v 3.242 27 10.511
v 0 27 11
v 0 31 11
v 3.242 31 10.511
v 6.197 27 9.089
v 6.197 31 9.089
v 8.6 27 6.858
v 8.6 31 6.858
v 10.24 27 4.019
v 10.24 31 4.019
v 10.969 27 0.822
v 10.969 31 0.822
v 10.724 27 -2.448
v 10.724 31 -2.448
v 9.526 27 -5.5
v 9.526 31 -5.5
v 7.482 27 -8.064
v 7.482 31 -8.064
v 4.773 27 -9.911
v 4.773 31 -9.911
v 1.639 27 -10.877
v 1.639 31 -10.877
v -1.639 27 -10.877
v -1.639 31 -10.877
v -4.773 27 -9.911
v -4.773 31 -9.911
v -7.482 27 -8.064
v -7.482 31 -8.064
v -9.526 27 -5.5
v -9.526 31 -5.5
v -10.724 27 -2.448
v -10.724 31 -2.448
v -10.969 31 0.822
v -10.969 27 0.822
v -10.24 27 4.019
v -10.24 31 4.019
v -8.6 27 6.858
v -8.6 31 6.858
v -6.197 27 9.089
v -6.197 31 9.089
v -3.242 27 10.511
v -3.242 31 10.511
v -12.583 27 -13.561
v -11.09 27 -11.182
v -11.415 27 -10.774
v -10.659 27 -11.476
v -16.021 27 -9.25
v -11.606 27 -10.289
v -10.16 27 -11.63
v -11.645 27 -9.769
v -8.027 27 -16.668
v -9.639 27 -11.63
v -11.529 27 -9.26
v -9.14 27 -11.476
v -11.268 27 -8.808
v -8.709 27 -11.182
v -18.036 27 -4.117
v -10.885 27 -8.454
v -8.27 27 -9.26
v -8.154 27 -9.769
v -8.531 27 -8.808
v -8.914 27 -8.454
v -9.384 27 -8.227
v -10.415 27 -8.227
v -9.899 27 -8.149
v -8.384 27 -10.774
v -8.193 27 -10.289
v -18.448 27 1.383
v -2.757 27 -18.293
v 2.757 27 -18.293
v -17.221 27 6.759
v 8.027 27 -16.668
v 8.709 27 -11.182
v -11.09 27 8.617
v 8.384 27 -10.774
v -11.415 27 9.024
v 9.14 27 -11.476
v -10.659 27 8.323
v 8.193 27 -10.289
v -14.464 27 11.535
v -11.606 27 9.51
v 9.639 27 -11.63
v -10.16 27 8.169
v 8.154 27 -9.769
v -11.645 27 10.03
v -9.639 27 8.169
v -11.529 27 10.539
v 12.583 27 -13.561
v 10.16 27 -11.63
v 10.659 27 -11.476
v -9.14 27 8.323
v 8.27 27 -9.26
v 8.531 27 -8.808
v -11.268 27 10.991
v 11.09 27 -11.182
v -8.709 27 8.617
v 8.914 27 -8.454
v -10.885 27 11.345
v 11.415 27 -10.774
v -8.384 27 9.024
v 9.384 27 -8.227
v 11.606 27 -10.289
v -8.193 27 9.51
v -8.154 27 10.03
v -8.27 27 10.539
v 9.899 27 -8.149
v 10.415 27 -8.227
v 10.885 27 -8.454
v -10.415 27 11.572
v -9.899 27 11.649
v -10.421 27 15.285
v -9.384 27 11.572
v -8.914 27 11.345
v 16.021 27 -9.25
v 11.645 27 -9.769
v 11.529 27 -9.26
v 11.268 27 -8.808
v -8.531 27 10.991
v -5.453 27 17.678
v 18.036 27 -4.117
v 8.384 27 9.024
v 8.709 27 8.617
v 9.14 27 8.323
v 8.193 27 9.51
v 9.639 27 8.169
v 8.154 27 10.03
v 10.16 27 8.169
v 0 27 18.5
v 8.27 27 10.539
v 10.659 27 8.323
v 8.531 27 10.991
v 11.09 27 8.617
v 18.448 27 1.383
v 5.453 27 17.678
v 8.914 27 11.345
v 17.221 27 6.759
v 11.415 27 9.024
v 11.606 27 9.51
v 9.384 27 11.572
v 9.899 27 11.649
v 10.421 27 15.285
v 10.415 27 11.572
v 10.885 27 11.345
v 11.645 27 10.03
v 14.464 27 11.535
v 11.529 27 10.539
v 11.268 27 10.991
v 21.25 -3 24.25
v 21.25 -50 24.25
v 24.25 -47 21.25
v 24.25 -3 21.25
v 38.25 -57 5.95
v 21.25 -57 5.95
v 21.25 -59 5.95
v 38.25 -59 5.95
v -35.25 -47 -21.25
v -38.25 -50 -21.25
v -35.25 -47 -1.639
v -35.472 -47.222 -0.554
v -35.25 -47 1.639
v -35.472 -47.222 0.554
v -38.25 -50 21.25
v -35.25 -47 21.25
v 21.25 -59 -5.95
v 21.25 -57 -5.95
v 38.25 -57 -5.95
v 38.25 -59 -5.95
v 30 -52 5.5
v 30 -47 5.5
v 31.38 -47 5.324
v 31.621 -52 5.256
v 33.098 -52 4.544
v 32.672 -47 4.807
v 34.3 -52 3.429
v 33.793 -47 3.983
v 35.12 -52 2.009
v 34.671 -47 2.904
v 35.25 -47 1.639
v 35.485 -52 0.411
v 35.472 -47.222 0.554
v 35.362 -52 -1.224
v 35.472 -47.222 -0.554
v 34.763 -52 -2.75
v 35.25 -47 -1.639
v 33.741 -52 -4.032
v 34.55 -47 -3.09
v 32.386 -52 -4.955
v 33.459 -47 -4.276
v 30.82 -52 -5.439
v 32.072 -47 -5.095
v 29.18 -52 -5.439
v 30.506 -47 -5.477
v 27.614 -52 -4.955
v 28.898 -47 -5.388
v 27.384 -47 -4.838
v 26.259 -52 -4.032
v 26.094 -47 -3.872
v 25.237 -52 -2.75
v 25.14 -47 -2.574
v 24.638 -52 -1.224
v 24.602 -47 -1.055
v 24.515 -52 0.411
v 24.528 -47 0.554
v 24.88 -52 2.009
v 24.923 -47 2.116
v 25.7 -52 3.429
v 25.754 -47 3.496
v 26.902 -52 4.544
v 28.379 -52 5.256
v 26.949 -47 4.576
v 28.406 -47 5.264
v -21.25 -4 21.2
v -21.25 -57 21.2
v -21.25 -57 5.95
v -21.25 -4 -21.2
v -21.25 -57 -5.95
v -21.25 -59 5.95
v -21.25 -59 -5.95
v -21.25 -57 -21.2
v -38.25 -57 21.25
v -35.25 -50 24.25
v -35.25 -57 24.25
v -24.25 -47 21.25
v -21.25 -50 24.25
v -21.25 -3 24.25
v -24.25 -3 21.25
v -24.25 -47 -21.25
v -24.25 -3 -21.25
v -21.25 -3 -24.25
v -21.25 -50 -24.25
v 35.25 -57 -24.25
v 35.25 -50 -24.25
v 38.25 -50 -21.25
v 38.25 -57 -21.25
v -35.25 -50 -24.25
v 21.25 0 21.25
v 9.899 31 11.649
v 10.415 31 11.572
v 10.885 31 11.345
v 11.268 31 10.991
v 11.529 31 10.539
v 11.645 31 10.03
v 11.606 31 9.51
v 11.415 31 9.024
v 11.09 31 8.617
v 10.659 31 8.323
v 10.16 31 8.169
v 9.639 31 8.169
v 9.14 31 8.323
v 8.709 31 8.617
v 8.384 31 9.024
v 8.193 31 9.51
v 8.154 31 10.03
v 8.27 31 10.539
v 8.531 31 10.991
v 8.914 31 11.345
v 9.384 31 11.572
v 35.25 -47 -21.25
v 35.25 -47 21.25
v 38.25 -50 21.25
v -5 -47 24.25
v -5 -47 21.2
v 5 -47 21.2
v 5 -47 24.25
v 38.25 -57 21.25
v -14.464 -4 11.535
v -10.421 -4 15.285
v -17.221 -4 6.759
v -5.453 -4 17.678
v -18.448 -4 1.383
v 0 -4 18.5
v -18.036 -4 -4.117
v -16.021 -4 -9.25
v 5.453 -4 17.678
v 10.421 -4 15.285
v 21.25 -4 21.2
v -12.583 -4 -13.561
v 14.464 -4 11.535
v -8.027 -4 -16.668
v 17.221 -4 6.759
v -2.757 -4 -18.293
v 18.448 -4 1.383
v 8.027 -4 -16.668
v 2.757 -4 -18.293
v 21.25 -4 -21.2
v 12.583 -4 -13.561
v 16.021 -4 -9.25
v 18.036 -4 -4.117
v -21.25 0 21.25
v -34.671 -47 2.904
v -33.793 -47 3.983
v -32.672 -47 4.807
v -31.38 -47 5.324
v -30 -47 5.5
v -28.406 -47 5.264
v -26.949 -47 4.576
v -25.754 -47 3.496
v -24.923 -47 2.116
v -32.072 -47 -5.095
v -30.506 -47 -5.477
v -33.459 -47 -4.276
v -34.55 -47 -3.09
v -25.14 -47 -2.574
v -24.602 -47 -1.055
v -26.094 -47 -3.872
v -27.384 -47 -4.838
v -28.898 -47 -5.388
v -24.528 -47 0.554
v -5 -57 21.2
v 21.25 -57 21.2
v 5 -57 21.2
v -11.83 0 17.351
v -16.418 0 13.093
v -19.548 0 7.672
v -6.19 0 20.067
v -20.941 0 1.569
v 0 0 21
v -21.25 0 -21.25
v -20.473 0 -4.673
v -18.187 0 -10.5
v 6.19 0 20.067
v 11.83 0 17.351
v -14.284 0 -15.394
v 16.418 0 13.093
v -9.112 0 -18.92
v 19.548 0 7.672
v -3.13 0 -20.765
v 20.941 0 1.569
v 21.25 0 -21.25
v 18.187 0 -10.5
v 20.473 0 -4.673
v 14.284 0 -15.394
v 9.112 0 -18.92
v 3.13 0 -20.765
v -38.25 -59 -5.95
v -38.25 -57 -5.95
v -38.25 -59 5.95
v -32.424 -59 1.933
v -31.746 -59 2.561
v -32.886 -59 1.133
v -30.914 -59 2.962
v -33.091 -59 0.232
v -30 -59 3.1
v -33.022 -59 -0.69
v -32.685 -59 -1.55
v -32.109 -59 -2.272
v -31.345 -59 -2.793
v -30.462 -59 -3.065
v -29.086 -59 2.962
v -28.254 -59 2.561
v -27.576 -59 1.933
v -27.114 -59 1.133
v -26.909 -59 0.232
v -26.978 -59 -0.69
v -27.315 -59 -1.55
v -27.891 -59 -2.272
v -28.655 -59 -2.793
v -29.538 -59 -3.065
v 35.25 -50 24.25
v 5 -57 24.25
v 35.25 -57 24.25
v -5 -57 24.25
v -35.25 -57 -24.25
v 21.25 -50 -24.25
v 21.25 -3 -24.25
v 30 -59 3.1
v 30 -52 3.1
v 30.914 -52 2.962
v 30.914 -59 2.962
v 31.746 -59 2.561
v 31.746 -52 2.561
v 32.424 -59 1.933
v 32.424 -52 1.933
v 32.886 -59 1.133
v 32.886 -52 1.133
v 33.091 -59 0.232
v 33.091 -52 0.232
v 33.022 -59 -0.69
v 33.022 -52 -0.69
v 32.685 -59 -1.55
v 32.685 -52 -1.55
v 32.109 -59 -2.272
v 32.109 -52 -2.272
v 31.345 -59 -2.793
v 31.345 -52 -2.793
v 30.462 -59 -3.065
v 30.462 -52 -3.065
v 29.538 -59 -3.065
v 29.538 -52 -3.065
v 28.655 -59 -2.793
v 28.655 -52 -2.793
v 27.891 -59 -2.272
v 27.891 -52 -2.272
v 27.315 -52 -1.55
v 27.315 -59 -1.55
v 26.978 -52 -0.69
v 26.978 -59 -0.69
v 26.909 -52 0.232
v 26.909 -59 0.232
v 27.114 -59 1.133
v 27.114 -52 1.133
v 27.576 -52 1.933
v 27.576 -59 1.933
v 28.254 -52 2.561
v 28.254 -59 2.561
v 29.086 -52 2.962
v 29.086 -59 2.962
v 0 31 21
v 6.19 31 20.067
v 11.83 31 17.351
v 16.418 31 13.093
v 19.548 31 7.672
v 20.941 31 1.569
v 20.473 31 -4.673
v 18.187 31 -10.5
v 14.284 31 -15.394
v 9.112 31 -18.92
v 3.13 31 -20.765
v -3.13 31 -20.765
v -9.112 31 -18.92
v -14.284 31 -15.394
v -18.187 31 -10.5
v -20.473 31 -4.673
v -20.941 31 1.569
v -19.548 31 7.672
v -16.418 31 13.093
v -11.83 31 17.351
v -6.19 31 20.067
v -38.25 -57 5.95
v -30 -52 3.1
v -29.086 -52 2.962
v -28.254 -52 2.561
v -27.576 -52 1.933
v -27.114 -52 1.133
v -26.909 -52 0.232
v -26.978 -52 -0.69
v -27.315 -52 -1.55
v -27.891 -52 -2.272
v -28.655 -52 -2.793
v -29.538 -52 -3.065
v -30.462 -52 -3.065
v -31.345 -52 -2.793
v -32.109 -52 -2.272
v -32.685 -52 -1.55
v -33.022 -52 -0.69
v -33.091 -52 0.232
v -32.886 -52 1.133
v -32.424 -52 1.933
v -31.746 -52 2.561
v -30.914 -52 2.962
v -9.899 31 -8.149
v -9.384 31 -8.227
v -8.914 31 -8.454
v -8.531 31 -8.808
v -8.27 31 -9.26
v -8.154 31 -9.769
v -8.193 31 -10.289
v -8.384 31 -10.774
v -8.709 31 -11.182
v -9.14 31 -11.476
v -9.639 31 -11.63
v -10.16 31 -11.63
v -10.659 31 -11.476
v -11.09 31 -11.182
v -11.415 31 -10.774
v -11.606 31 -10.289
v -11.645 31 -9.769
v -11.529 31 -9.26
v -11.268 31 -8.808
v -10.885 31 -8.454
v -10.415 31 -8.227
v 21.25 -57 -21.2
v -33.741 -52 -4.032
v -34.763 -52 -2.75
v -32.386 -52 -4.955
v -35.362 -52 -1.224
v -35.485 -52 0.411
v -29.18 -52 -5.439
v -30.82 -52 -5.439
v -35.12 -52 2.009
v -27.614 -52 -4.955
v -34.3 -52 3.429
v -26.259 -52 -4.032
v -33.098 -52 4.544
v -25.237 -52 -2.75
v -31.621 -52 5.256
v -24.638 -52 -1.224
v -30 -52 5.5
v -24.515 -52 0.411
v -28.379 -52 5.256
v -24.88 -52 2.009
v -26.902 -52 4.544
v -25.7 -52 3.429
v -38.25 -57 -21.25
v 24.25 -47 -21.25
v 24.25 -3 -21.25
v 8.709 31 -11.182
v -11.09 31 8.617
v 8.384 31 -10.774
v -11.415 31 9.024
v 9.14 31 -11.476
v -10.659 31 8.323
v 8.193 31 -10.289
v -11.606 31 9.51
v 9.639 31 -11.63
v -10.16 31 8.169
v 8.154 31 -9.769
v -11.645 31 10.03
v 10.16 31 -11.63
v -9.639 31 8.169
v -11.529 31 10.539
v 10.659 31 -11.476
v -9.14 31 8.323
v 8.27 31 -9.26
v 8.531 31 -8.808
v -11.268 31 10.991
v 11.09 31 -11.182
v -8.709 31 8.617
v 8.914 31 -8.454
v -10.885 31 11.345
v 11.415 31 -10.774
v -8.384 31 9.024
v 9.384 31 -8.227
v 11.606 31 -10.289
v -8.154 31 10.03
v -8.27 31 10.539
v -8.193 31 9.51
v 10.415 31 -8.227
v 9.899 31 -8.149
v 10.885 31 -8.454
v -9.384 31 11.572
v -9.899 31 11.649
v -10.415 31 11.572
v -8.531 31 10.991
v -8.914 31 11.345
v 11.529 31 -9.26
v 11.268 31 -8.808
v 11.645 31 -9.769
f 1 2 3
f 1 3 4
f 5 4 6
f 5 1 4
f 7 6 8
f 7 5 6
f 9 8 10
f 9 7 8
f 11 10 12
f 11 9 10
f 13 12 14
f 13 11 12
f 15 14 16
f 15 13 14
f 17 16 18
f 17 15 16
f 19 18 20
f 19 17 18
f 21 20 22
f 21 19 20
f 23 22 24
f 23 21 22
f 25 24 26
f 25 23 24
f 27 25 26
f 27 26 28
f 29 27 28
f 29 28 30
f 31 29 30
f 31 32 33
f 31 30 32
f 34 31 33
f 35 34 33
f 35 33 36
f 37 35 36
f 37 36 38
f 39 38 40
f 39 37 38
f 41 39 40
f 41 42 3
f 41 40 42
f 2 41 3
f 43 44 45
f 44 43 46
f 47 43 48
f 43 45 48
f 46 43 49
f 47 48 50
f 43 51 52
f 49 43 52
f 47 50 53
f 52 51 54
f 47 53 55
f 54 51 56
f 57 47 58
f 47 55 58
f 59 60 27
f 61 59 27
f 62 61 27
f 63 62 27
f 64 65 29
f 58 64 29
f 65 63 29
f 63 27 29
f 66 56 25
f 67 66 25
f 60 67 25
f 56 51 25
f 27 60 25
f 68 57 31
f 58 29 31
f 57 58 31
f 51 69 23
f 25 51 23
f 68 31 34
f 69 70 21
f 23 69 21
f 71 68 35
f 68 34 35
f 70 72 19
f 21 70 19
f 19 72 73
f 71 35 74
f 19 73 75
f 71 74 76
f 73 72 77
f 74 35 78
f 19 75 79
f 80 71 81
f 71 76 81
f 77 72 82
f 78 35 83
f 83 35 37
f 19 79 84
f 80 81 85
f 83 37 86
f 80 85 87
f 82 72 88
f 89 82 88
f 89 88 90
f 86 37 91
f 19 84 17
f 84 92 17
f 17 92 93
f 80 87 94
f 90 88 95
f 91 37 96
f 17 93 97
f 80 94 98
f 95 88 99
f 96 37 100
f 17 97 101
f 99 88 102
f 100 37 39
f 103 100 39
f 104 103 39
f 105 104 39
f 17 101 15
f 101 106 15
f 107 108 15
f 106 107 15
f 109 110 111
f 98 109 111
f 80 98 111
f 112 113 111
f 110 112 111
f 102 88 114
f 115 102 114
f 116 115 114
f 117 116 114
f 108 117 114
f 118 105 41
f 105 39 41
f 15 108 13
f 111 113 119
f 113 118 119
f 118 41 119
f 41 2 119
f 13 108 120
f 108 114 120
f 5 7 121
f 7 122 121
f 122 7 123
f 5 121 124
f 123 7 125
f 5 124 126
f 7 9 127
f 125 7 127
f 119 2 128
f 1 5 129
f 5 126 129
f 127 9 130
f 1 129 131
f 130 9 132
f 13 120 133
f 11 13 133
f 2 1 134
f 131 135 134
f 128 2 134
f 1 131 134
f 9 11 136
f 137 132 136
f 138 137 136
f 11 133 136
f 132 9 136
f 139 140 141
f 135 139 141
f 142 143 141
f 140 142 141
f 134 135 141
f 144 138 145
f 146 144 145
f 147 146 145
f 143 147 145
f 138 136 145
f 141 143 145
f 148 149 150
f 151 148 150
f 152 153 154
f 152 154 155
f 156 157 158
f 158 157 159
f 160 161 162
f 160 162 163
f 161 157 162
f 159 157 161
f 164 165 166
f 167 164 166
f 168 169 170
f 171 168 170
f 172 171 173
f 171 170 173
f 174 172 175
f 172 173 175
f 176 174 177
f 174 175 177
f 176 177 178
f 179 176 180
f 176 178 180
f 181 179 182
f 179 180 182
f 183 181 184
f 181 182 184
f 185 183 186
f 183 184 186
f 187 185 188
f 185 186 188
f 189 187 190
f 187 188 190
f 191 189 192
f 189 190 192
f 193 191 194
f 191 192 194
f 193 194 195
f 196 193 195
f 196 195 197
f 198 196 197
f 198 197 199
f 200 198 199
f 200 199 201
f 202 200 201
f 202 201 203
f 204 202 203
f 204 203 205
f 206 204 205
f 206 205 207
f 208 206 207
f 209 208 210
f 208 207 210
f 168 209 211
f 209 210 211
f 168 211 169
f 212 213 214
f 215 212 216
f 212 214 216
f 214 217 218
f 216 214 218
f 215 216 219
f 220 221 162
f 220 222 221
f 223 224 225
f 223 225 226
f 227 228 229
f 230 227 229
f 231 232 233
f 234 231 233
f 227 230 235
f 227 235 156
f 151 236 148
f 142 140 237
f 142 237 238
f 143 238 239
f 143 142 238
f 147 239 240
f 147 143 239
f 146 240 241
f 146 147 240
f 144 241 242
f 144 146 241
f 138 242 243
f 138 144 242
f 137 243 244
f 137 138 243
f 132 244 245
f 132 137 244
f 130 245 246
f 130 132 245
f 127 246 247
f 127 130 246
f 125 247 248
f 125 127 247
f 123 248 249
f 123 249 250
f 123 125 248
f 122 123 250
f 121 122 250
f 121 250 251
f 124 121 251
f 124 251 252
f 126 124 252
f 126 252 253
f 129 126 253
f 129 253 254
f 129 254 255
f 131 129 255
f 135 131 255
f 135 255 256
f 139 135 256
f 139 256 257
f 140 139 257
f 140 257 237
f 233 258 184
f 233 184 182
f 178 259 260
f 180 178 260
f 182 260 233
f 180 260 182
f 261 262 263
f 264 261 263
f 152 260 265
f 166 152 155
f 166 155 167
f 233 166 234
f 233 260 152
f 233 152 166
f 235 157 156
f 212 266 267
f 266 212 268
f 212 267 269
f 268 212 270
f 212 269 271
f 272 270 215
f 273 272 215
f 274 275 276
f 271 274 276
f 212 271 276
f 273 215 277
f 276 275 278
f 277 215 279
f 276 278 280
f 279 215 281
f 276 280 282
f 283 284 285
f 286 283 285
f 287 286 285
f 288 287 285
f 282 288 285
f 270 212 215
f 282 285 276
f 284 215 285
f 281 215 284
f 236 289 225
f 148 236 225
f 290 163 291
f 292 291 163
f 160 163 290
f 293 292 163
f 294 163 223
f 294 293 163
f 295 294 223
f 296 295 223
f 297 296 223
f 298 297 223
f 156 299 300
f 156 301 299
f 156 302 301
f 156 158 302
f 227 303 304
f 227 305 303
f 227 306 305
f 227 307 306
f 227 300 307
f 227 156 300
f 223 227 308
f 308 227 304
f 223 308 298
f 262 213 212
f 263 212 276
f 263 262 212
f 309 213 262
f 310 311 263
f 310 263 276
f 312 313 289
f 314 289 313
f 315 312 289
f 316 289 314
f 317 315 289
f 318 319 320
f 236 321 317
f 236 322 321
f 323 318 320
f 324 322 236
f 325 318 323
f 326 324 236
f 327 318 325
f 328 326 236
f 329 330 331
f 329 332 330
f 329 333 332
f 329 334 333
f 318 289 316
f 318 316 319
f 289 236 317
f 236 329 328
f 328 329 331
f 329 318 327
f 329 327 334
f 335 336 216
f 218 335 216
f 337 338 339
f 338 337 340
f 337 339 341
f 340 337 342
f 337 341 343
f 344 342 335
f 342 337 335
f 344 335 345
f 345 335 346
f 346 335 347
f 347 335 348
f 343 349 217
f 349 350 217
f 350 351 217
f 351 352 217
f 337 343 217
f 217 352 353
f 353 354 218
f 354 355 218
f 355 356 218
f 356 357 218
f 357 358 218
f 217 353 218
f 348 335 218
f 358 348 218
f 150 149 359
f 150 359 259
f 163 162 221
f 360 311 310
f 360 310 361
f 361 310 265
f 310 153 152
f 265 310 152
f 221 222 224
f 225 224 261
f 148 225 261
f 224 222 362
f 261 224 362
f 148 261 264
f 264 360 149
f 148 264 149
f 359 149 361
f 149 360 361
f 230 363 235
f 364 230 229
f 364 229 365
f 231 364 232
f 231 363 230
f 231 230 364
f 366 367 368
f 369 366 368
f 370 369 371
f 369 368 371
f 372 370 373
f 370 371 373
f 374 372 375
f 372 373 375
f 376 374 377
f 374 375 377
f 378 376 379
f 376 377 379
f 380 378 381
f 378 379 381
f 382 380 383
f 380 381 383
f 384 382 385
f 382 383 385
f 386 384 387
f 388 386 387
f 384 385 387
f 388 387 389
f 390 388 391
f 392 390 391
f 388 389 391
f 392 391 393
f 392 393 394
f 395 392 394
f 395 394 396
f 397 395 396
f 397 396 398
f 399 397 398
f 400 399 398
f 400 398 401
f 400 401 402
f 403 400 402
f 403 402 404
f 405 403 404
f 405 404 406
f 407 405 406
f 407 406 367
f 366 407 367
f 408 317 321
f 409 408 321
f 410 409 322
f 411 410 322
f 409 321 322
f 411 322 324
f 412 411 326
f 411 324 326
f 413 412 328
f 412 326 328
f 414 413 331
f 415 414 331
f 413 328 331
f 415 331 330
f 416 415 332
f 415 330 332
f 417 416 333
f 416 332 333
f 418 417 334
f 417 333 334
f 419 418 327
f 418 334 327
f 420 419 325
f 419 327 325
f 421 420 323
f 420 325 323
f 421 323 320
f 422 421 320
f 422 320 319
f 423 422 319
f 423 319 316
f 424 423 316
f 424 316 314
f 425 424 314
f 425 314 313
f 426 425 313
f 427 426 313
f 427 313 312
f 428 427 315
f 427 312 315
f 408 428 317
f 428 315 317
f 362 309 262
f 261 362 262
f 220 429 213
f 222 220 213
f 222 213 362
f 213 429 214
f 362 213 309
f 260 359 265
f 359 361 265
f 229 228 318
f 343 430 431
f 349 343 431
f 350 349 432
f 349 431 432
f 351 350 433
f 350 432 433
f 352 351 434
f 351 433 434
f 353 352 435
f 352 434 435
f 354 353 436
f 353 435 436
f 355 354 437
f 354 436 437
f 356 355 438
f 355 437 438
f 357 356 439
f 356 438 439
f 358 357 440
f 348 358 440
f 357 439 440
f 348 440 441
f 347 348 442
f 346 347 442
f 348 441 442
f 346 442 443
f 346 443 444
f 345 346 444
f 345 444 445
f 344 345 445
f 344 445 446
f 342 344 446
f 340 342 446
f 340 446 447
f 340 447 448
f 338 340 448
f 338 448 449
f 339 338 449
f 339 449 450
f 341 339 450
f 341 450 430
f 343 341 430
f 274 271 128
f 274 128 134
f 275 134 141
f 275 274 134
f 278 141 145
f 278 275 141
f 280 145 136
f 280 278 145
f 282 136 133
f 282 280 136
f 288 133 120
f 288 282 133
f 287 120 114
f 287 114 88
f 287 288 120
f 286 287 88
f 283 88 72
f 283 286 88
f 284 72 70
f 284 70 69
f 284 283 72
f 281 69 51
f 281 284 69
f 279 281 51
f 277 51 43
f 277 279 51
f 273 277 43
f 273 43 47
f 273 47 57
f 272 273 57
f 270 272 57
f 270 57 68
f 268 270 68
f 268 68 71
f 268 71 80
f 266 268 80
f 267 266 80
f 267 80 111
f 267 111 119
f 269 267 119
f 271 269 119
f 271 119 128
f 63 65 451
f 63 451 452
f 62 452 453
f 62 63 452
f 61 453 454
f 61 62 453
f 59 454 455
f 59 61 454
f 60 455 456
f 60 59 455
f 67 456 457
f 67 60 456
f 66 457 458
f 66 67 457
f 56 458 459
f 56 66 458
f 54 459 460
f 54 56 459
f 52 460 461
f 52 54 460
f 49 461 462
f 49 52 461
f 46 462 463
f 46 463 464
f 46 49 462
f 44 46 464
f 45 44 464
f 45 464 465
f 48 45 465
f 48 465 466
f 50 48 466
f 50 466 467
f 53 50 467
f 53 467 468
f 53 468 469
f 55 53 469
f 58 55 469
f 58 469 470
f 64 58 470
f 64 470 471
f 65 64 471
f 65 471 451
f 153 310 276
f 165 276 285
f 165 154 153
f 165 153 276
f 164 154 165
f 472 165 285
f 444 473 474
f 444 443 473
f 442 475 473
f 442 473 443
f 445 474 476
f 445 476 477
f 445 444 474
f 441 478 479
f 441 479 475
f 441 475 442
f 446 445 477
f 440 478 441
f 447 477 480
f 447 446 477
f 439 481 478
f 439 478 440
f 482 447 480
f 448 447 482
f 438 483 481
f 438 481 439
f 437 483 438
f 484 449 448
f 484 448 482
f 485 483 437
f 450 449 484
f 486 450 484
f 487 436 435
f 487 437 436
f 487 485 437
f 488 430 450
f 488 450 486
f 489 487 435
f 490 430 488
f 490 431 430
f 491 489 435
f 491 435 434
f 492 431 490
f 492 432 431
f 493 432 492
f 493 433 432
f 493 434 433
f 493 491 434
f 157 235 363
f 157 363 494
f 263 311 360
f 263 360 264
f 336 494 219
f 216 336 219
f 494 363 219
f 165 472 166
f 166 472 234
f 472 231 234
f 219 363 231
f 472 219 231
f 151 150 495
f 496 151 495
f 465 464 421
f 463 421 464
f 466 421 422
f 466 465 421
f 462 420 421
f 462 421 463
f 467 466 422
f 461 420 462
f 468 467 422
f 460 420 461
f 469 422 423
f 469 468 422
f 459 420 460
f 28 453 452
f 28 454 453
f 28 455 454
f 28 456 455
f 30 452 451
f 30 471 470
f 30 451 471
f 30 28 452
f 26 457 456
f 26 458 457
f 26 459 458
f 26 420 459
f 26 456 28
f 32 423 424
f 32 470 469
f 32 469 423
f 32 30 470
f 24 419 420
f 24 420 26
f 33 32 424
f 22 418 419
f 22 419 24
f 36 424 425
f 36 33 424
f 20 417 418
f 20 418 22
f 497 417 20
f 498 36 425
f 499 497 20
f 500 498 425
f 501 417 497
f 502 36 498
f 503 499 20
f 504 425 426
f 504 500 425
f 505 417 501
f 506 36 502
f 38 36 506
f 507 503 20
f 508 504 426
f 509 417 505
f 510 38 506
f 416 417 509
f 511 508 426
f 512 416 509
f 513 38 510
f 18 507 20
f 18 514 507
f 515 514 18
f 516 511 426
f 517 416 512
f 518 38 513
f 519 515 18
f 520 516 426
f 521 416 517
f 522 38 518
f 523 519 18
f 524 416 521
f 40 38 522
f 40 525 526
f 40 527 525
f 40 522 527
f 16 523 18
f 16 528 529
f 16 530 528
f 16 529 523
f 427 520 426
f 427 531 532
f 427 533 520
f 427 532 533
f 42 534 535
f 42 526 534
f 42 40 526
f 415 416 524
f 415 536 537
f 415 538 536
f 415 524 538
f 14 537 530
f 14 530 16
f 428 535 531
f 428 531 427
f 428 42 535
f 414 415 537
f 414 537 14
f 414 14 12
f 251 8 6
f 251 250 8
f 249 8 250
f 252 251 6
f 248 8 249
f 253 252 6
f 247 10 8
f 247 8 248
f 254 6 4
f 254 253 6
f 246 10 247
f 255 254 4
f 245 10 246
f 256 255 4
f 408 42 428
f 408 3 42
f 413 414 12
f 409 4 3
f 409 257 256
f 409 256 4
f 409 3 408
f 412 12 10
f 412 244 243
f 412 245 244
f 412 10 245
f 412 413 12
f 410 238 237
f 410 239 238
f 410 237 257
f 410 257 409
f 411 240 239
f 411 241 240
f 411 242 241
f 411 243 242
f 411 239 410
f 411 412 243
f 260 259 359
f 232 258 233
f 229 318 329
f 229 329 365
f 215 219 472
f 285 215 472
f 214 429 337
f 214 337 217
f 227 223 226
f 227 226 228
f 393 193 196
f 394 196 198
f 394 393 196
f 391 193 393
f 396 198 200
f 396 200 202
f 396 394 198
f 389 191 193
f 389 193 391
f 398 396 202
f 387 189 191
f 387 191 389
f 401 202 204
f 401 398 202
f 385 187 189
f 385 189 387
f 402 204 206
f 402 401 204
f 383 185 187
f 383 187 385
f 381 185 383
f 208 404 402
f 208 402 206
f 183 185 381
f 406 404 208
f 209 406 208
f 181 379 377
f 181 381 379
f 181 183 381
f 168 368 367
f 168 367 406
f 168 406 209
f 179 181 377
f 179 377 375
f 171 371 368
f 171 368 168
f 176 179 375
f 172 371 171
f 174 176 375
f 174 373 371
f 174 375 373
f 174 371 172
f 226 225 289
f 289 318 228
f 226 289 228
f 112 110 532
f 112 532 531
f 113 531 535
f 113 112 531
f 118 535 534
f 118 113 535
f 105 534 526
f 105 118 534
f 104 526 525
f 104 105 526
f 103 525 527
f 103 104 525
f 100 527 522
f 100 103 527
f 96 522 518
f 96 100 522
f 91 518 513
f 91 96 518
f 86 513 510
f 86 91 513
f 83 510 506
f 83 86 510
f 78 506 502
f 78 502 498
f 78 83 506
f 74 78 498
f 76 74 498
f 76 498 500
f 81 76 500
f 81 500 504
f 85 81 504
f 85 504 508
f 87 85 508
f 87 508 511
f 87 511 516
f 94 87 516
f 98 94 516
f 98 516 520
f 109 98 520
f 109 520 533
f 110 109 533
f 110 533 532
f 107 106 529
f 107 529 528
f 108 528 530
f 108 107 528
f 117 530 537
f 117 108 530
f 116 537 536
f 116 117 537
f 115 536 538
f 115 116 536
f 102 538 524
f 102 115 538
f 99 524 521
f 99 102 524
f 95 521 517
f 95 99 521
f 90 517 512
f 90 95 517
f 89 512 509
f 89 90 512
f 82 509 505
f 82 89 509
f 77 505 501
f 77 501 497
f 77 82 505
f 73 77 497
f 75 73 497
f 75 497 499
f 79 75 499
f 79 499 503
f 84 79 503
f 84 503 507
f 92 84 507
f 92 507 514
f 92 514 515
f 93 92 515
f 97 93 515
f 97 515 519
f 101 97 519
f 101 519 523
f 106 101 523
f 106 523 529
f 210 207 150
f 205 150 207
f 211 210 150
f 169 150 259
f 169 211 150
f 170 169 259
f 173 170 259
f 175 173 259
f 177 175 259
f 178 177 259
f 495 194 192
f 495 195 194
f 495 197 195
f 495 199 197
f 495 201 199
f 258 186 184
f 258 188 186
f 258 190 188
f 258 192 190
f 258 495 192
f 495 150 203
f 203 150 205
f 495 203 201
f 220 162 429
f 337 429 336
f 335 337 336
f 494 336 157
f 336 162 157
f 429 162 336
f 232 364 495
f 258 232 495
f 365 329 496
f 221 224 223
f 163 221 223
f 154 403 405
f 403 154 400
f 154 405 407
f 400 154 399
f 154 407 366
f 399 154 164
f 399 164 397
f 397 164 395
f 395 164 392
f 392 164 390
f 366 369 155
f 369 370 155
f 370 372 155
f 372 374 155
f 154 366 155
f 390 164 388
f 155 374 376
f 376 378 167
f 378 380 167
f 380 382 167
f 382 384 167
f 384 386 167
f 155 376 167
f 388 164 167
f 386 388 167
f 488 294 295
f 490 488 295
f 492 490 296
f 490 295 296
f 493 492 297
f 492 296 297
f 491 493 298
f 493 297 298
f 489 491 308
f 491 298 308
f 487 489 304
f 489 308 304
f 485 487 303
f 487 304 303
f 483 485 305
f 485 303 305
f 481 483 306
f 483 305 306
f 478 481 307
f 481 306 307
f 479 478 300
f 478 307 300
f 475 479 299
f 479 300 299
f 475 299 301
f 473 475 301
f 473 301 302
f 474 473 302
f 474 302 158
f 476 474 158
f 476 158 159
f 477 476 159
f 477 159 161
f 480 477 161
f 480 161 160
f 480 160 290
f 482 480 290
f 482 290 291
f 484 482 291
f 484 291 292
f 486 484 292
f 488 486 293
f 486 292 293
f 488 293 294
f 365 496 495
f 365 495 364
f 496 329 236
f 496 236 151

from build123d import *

# Parameters (mm, degrees)
SKETCH1_R               = 21
SKETCH1_R_2             = 1.75
BOSS_EXTRUDE1_DEPTH     = 31
SKETCH3_W               = 48.5
SKETCH3_H               = 48.5
SKETCH3_R               = 18.5
BOSS_EXTRUDE2_DEPTH     = 57
CUT_EXTRUDE2_DEPTH      = 67.521613029
CUT_EXTRUDE2_DEPTH_BACK = 67.521613029
SKETCH4_R               = 11
SKETCH5_W               = 10
SKETCH5_H               = 20
CUT_EXTRUDE3_DEPTH      = 67.521613029
BOSS_EXTRUDE3_START     = -57
SKETCH6_W               = 14
SKETCH6_H               = 48.5
BOSS_EXTRUDE3_DEPTH     = 10
BOSS_EXTRUDE4_START     = -57
SKETCH7_W               = 76.5
SKETCH7_H               = 11.9
BOSS_EXTRUDE4_DEPTH     = 2
CUT_EXTRUDE1_DEPTH      = 27
CUT_EXTRUDE1_DEPTH_BACK = 75.378256231
SKETCH2_R               = 18.5
SKETCH8_R               = 3.1
CUT_EXTRUDE4_DEPTH      = 75.378256231
CUT_EXTRUDE5_START      = -47
SKETCH9_R               = 5.5
CUT_EXTRUDE5_DEPTH      = 5
CUT_EXTRUDE6_DEPTH      = 53
CUT_EXTRUDE6_DEPTH_BACK = 75.378256231
CUT_EXTRUDE6_START      = -57
SKETCH11_W              = 42.5
SKETCH11_H              = 42.4


with BuildPart() as part:
    # Sketch1 → Boss-Extrude1 (new body)
    with BuildSketch(Plane(origin=(0, 0, 0), x_dir=(1, 0, 0), z_dir=(0, 1, 0))):
        with Locations(Location((0, 0, 0), (0, 0, 270))):
            Circle(SKETCH1_R)
        with Locations(Location((-9.899494937, -9.899494937, 0), (0, 0, 270))):
            Circle(SKETCH1_R_2, mode=Mode.SUBTRACT)
        with Locations(Location((-9.899494937, 9.899494937, 0), (0, 0, 270))):
            Circle(SKETCH1_R_2, mode=Mode.SUBTRACT)
        with Locations(Location((9.899494937, 9.899494937, 0), (0, 0, 270))):
            Circle(SKETCH1_R_2, mode=Mode.SUBTRACT)
        with Locations(Location((9.899494937, -9.899494937, 0), (0, 0, 270))):
            Circle(SKETCH1_R_2, mode=Mode.SUBTRACT)
    extrude(amount=BOSS_EXTRUDE1_DEPTH)

    # Sketch3 → Boss-Extrude2 (add)
    with BuildSketch(Plane(origin=(0, 0, 0), x_dir=(1, 0, 0), z_dir=(0, 1, 0))):
        Rectangle(SKETCH3_W, SKETCH3_H)
        with Locations(Location((0, 0, 0), (0, 0, 270))):
            Circle(SKETCH3_R, mode=Mode.SUBTRACT)
    extrude(amount=-BOSS_EXTRUDE2_DEPTH)

    # Sketch4 → Cut-Extrude2 (cut, two sides: drawn at the far end of the back side and taken through both)
    with BuildSketch(Plane(origin=(0, 0, 0), x_dir=(1, 0, 0), z_dir=(0, 1, 0)).offset(-CUT_EXTRUDE2_DEPTH_BACK)):
        with Locations(Location((0, 0, 0), (0, 0, 270))):
            Circle(SKETCH4_R)
    extrude(amount=CUT_EXTRUDE2_DEPTH + CUT_EXTRUDE2_DEPTH_BACK, mode=Mode.SUBTRACT)

    # Sketch5 → Cut-Extrude3 (cut, through all)
    with BuildSketch(Plane.XY):
        with Locations((0, -57)):
            Rectangle(SKETCH5_W, SKETCH5_H)
    extrude(amount=CUT_EXTRUDE3_DEPTH, mode=Mode.SUBTRACT)

    # Sketch6 → Boss-Extrude3 (add)
    with BuildSketch(Plane(origin=(0, 0, 0), x_dir=(1, 0, 0), z_dir=(0, 1, 0)).offset(BOSS_EXTRUDE3_START)):
        with Locations((-31.25, 0)):
            Rectangle(SKETCH6_W, SKETCH6_H)
        with Locations((31.25, 0)):
            Rectangle(SKETCH6_W, SKETCH6_H)
    extrude(amount=BOSS_EXTRUDE3_DEPTH)

    # Sketch7 → Boss-Extrude4 (add)
    with BuildSketch(Plane(origin=(0, 0, 0), x_dir=(1, 0, 0), z_dir=(0, 1, 0)).offset(BOSS_EXTRUDE4_START)):
        Rectangle(SKETCH7_W, SKETCH7_H)
    extrude(amount=-BOSS_EXTRUDE4_DEPTH)

    # Sketch2 → Cut-Extrude1 (cut, two sides: drawn at the far end of the back side and taken through both)
    with BuildSketch(Plane(origin=(0, 0, 0), x_dir=(1, 0, 0), z_dir=(0, 1, 0)).offset(-CUT_EXTRUDE1_DEPTH_BACK)):
        with Locations(Location((0, 0, 0), (0, 0, 270))):
            Circle(SKETCH2_R)
    extrude(amount=CUT_EXTRUDE1_DEPTH + CUT_EXTRUDE1_DEPTH_BACK, mode=Mode.SUBTRACT)

    # Sketch8 → Cut-Extrude4 (cut, through all)
    with BuildSketch(Plane(origin=(0, 0, 0), x_dir=(1, 0, 0), z_dir=(0, 1, 0))):
        with Locations(Location((-30, 0, 0), (0, 0, 270))):
            Circle(SKETCH8_R)
        with Locations(Location((30, 0, 0), (0, 0, 270))):
            Circle(SKETCH8_R)
    extrude(amount=-CUT_EXTRUDE4_DEPTH, mode=Mode.SUBTRACT)

    # Sketch9 → Cut-Extrude5 (cut)
    with BuildSketch(Plane(origin=(0, 0, 0), x_dir=(1, 0, 0), z_dir=(0, 1, 0)).offset(CUT_EXTRUDE5_START)):
        with Locations(Location((-30, 0, 0), (0, 0, 270))):
            Circle(SKETCH9_R)
        with Locations(Location((30, 0, 0), (0, 0, 270))):
            Circle(SKETCH9_R)
    extrude(amount=-CUT_EXTRUDE5_DEPTH, mode=Mode.SUBTRACT)

    # Chamfer1
    # the kernel refuses this chamfer: 3 mm, written as the material it takes off along each edge
    with BuildSketch(Plane(origin=(-22.25, -2, 22.25), x_dir=(0, -0.7071067811865476, 0.7071067811865476), z_dir=(-0.5773502691896257, 0.5773502691896257, 0.5773502691896257)), Plane(origin=(-22.25, -2, -22.25), x_dir=(-0.7071067811865476, -0.7071067811865476, 0), z_dir=(-0.5773502691896257, 0.5773502691896257, -0.5773502691896257)), Plane(origin=(36.25, -49, 22.25), x_dir=(-1.6747652892626914e-15, 0.7071067811865467, -0.7071067811865483), z_dir=(0.5773502691896266, 0.5773502691896266, 0.577350269189624))) as chamfer1_piece_1:
        Polygon((-2.121320344, 1.224744871), (2.121320344, 1.224744871), (0, -2.449489743), align=None)
    extrude(amount=3.810511777, mode=Mode.SUBTRACT)
    with BuildSketch(Plane(origin=(22.25, -2, 22.25), x_dir=(0, -0.7071067811865476, 0.7071067811865476), z_dir=(0.5773502691896257, 0.5773502691896257, 0.5773502691896257)), Plane(origin=(22.25, -2, -22.25), x_dir=(0.7071067811865476, -0.7071067811865476, 0), z_dir=(0.5773502691896257, 0.5773502691896257, -0.5773502691896257)), Plane(origin=(-36.25, -49, -22.25), x_dir=(0.7071067811865476, 0.7071067811865476, 0), z_dir=(-0.5773502691896264, 0.5773502691896264, -0.5773502691896244)), Plane(origin=(-36.25, -49, 22.25), x_dir=(0.7071067811865479, 0, 0.707106781186547), z_dir=(-0.5773502691896255, 0.5773502691896255, 0.5773502691896262)), Plane(origin=(36.25, -49, -22.25), x_dir=(0.7071067811865476, -0.7071067811865476, 0), z_dir=(0.5773502691896251, 0.5773502691896258, -0.5773502691896265))) as chamfer1_piece_2:
        Polygon((-2.121320344, -1.224744871), (2.121320344, -1.224744871), (0, 2.449489743), align=None)
    extrude(amount=3.810511777, mode=Mode.SUBTRACT)
    with BuildSketch(Plane(origin=(-24.25, 0, 31.965048964), x_dir=(0.9996219169112968, 0.02749587661058636, 0), z_dir=(0, 0, -1)), Plane(origin=(31.965048964, 0, 24.25), x_dir=(0, 0.02749587661058636, -0.9996219169112968), z_dir=(-1, 0, 0)), Plane(origin=(24.25, 0, -31.965048964), x_dir=(-0.9996219169112968, 0.02749587661058636, 0), z_dir=(0, 0, 1)), Plane(origin=(-31.965048964, 0, -24.25), x_dir=(0, 0.02749587661058636, 0.9996219169112968), z_dir=(1, 0, 0))) as chamfer1_piece_3:
        with BuildLine():
            Line((3.086019586, 0), (-0.169641465, 3.081353381))
            Line((-0.169641465, 3.081353381), (-0.22961878, 3.079703628))
            ThreePointArc((-0.22961878, 3.079703628), (-0.102387681, 1.540193489), (-0.059977315, -0.001649753))
            Line((-0.059977315, -0.001649753), (0.001649753, -0.059977315))
            ThreePointArc((0.001649753, -0.059977315), (1.543492994, -0.017566949), (3.087669338, -0.059977315))
            Line((3.087669338, -0.059977315), (3.086019586, 0))
        make_face()
    extrude(amount=63.930097928, mode=Mode.SUBTRACT)
    with BuildSketch(Plane(origin=(-24.25, 7.715048964, -24.25), x_dir=(-0.027495876610586768, 0, 0.9996219169112968), z_dir=(0, -1, 0)), Plane(origin=(-24.25, 7.715048964, 24.25), x_dir=(0.9996219169112965, 0, 0.02749587661058676), z_dir=(0, -1, 0))) as chamfer1_piece_4:
        with BuildLine():
            Line((3.086019586, 0), (-0.169641465, -3.081353381))
            Line((-0.169641465, -3.081353381), (-0.22961878, -3.079703628))
            ThreePointArc((-0.22961878, -3.079703628), (-0.102387681, -1.540193489), (-0.059977315, 0.001649753))
            Line((-0.059977315, 0.001649753), (0.001649753, 0.059977315))
            ThreePointArc((0.001649753, 0.059977315), (1.543492994, 0.017566949), (3.087669338, 0.059977315))
            Line((3.087669338, 0.059977315), (3.086019586, 0))
        make_face()
    extrude(amount=54.715048964, mode=Mode.SUBTRACT)
    with BuildSketch(Plane(origin=(-38.25, -64.715048964, -24.25), x_dir=(0.9996219169112965, 0, -0.027495876610587913), z_dir=(0, 1, 0)), Plane(origin=(38.25, -64.715048964, 24.25), x_dir=(-0.9996219169112965, 0, 0.027495876610587913), z_dir=(0, 1, 0))) as chamfer1_piece_5:
        with BuildLine():
            Line((3.086019586, 0), (-0.169641465, -3.081353381))
            Line((-0.169641465, -3.081353381), (-0.22961878, -3.079703628))
            ThreePointArc((-0.22961878, -3.079703628), (-0.102387681, -1.540193489), (-0.059977315, 0.001649753))
            Line((-0.059977315, 0.001649753), (0.001649753, 0.059977315))
            ThreePointArc((0.001649753, 0.059977315), (1.543492994, 0.017566949), (3.087669338, 0.059977315))
            Line((3.087669338, 0.059977315), (3.086019586, 0))
        make_face()
    extrude(amount=25.430097928, mode=Mode.SUBTRACT)
    with BuildSketch(Plane(origin=(-38.25, -64.715048964, 24.25), x_dir=(0.9996219169112968, 0, 0.027495876610585616), z_dir=(0, 1, 0)), Plane(origin=(38.25, -64.715048964, -24.25), x_dir=(-0.9996219169112968, 0, -0.027495876610585616), z_dir=(0, 1, 0))) as chamfer1_piece_6:
        with BuildLine():
            Line((3.086019586, 0), (-0.169641465, 3.081353381))
            Line((-0.169641465, 3.081353381), (-0.22961878, 3.079703628))
            ThreePointArc((-0.22961878, 3.079703628), (-0.102387681, 1.540193489), (-0.059977315, -0.001649753))
            Line((-0.059977315, -0.001649753), (0.001649753, -0.059977315))
            ThreePointArc((0.001649753, -0.059977315), (1.543492994, -0.017566949), (3.087669338, -0.059977315))
            Line((3.087669338, -0.059977315), (3.086019586, 0))
        make_face()
    extrude(amount=25.430097928, mode=Mode.SUBTRACT)
    with BuildSketch(Plane(origin=(-45.965048964, -47, -24.25), x_dir=(0, -0.9996219169112965, -0.02749587661058676), z_dir=(1, 0, 0)), Plane(origin=(-24.25, -47, 24.25), x_dir=(0, -0.9996219169112965, 0.02749587661058676), z_dir=(-1, 0, 0))) as chamfer1_piece_7:
        with BuildLine():
            Line((3.086019586, 0), (-0.169641465, -3.081353381))
            Line((-0.169641465, -3.081353381), (-0.22961878, -3.079703628))
            ThreePointArc((-0.22961878, -3.079703628), (-0.102387681, -1.540193489), (-0.059977315, 0.001649753))
            Line((-0.059977315, 0.001649753), (0.001649753, 0.059977315))
            ThreePointArc((0.001649753, 0.059977315), (1.543492994, 0.017566949), (3.087669338, 0.059977315))
            Line((3.087669338, 0.059977315), (3.086019586, 0))
        make_face()
    extrude(amount=21.715048964, mode=Mode.SUBTRACT)
    with BuildSketch(Plane(origin=(-38.25, -47, 31.965048964), x_dir=(-0.027495876610586768, -0.9996219169112968, 0), z_dir=(0, 0, -1)), Plane(origin=(38.25, -47, 31.965048964), x_dir=(-0.9996219169112965, 0.02749587661058676, 0), z_dir=(0, 0, -1))) as chamfer1_piece_8:
        with BuildLine():
            Line((3.086019586, 0), (-0.169641465, -3.081353381))
            Line((-0.169641465, -3.081353381), (-0.22961878, -3.079703628))
            ThreePointArc((-0.22961878, -3.079703628), (-0.102387681, -1.540193489), (-0.059977315, 0.001649753))
            Line((-0.059977315, 0.001649753), (0.001649753, 0.059977315))
            ThreePointArc((0.001649753, 0.059977315), (1.543492994, 0.017566949), (3.087669338, 0.059977315))
            Line((3.087669338, 0.059977315), (3.086019586, 0))
        make_face()
    extrude(amount=63.930097928, mode=Mode.SUBTRACT)
    with BuildSketch(Plane(origin=(24.25, 7.715048964, 24.25), x_dir=(-0.9996219169112965, 0, 0.02749587661058676), z_dir=(0, -1, 0)), Plane(origin=(24.25, 7.715048964, -24.25), x_dir=(0.027495876610586768, 0, 0.9996219169112968), z_dir=(0, -1, 0))) as chamfer1_piece_9:
        with BuildLine():
            Line((3.086019586, 0), (-0.169641465, 3.081353381))
            Line((-0.169641465, 3.081353381), (-0.22961878, 3.079703628))
            ThreePointArc((-0.22961878, 3.079703628), (-0.102387681, 1.540193489), (-0.059977315, -0.001649753))
            Line((-0.059977315, -0.001649753), (0.001649753, -0.059977315))
            ThreePointArc((0.001649753, -0.059977315), (1.543492994, -0.017566949), (3.087669338, -0.059977315))
            Line((3.087669338, -0.059977315), (3.086019586, 0))
        make_face()
    extrude(amount=54.715048964, mode=Mode.SUBTRACT)
    with BuildSketch(Plane(origin=(45.965048964, -47, -24.25), x_dir=(0, -0.9996219169112965, -0.02749587661058676), z_dir=(-1, 0, 0)), Plane(origin=(24.25, -47, 24.25), x_dir=(0, -0.9996219169112965, 0.02749587661058676), z_dir=(1, 0, 0))) as chamfer1_piece_10:
        with BuildLine():
            Line((3.086019586, 0), (-0.169641465, 3.081353381))
            Line((-0.169641465, 3.081353381), (-0.22961878, 3.079703628))
            ThreePointArc((-0.22961878, 3.079703628), (-0.102387681, 1.540193489), (-0.059977315, -0.001649753))
            Line((-0.059977315, -0.001649753), (0.001649753, -0.059977315))
            ThreePointArc((0.001649753, -0.059977315), (1.543492994, -0.017566949), (3.087669338, -0.059977315))
            Line((3.087669338, -0.059977315), (3.086019586, 0))
        make_face()
    extrude(amount=21.715048964, mode=Mode.SUBTRACT)
    with BuildSketch(Plane(origin=(-24.25, 7.715048964, -24.25), x_dir=(-0.027495876610586768, 0, 0.9996219169112968), z_dir=(0, -1, 0))) as chamfer1_piece_11a_section:
        with BuildLine():
            Line((3.086019586, 0), (-0.169641465, -3.081353381))
            Line((-0.169641465, -3.081353381), (-0.22961878, -3.079703628))
            ThreePointArc((-0.22961878, -3.079703628), (-0.102387681, -1.540193489), (-0.059977315, 0.001649753))
            Line((-0.059977315, 0.001649753), (0.001649753, 0.059977315))
            ThreePointArc((0.001649753, 0.059977315), (1.543492994, 0.017566949), (3.087669338, 0.059977315))
            Line((3.087669338, 0.059977315), (3.086019586, 0))
        make_face()
    chamfer1_piece_11a = extrude(amount=62.430097928, mode=Mode.PRIVATE)
    chamfer1_piece_11a = split(chamfer1_piece_11a, bisect_by=Plane(origin=(-23.26061912, -47, -23.26061912), z_dir=(0, -1, 0)), keep=Keep.TOP, mode=Mode.PRIVATE)
    with BuildSketch(Plane(origin=(-45.965048964, -47, -24.25), x_dir=(0, -0.9996219169112965, -0.02749587661058676), z_dir=(1, 0, 0))) as chamfer1_piece_11b_section:
        with BuildLine():
            Line((3.086019586, 0), (-0.169641465, -3.081353381))
            Line((-0.169641465, -3.081353381), (-0.22961878, -3.079703628))
            ThreePointArc((-0.22961878, -3.079703628), (-0.102387681, -1.540193489), (-0.059977315, 0.001649753))
            Line((-0.059977315, 0.001649753), (0.001649753, 0.059977315))
            ThreePointArc((0.001649753, 0.059977315), (1.543492994, 0.017566949), (3.087669338, 0.059977315))
            Line((3.087669338, 0.059977315), (3.086019586, 0))
        make_face()
    chamfer1_piece_11b = extrude(amount=29.430097928, mode=Mode.PRIVATE)
    chamfer1_piece_11b = split(chamfer1_piece_11b, bisect_by=Plane(origin=(-24.25, -47.98938088, -23.26061912), z_dir=(1, 0, 0)), keep=Keep.TOP, mode=Mode.PRIVATE)
    chamfer1_piece_11 = chamfer1_piece_11a & chamfer1_piece_11b
    add(chamfer1_piece_11, mode=Mode.SUBTRACT)
    with BuildSketch(Plane(origin=(-16.534951036, -47, 24.25), x_dir=(0, -0.9996219169112965, 0.02749587661058676), z_dir=(-1, 0, 0))) as chamfer1_piece_12a_section:
        with BuildLine():
            Line((3.086019586, 0), (-0.169641465, -3.081353381))
            Line((-0.169641465, -3.081353381), (-0.22961878, -3.079703628))
            ThreePointArc((-0.22961878, -3.079703628), (-0.102387681, -1.540193489), (-0.059977315, 0.001649753))
            Line((-0.059977315, 0.001649753), (0.001649753, 0.059977315))
            ThreePointArc((0.001649753, 0.059977315), (1.543492994, 0.017566949), (3.087669338, 0.059977315))
            Line((3.087669338, 0.059977315), (3.086019586, 0))
        make_face()
    chamfer1_piece_12a = extrude(amount=29.430097928, mode=Mode.PRIVATE)
    chamfer1_piece_12a = split(chamfer1_piece_12a, bisect_by=Plane(origin=(-24.25, -47.98938088, 23.26061912), z_dir=(1, 0, 0)), keep=Keep.TOP, mode=Mode.PRIVATE)
    with BuildSketch(Plane(origin=(-24.25, 7.715048964, 24.25), x_dir=(0.9996219169112965, 0, 0.02749587661058676), z_dir=(0, -1, 0))) as chamfer1_piece_12b_section:
        with BuildLine():
            Line((3.086019586, 0), (-0.169641465, -3.081353381))
            Line((-0.169641465, -3.081353381), (-0.22961878, -3.079703628))
            ThreePointArc((-0.22961878, -3.079703628), (-0.102387681, -1.540193489), (-0.059977315, 0.001649753))
            Line((-0.059977315, 0.001649753), (0.001649753, 0.059977315))
            ThreePointArc((0.001649753, 0.059977315), (1.543492994, 0.017566949), (3.087669338, 0.059977315))
            Line((3.087669338, 0.059977315), (3.086019586, 0))
        make_face()
    chamfer1_piece_12b = extrude(amount=62.430097928, mode=Mode.PRIVATE)
    chamfer1_piece_12b = split(chamfer1_piece_12b, bisect_by=Plane(origin=(-23.26061912, -47, 23.26061912), z_dir=(0, -1, 0)), keep=Keep.TOP, mode=Mode.PRIVATE)
    chamfer1_piece_12 = chamfer1_piece_12a & chamfer1_piece_12b
    add(chamfer1_piece_12, mode=Mode.SUBTRACT)
    with BuildSketch(Plane(origin=(24.25, 7.715048964, 24.25), x_dir=(-0.9996219169112965, 0, 0.02749587661058676), z_dir=(0, -1, 0))) as chamfer1_piece_13a_section:
        with BuildLine():
            Line((3.086019586, 0), (-0.169641465, 3.081353381))
            Line((-0.169641465, 3.081353381), (-0.22961878, 3.079703628))
            ThreePointArc((-0.22961878, 3.079703628), (-0.102387681, 1.540193489), (-0.059977315, -0.001649753))
            Line((-0.059977315, -0.001649753), (0.001649753, -0.059977315))
            ThreePointArc((0.001649753, -0.059977315), (1.543492994, -0.017566949), (3.087669338, -0.059977315))
            Line((3.087669338, -0.059977315), (3.086019586, 0))
        make_face()
    chamfer1_piece_13a = extrude(amount=62.430097928, mode=Mode.PRIVATE)
    chamfer1_piece_13a = split(chamfer1_piece_13a, bisect_by=Plane(origin=(23.26061912, -47, 23.26061912), z_dir=(0, -1, 0)), keep=Keep.TOP, mode=Mode.PRIVATE)
    with BuildSketch(Plane(origin=(16.534951036, -47, 24.25), x_dir=(0, -0.9996219169112965, 0.02749587661058676), z_dir=(1, 0, 0))) as chamfer1_piece_13b_section:
        with BuildLine():
            Line((3.086019586, 0), (-0.169641465, 3.081353381))
            Line((-0.169641465, 3.081353381), (-0.22961878, 3.079703628))
            ThreePointArc((-0.22961878, 3.079703628), (-0.102387681, 1.540193489), (-0.059977315, -0.001649753))
            Line((-0.059977315, -0.001649753), (0.001649753, -0.059977315))
            ThreePointArc((0.001649753, -0.059977315), (1.543492994, -0.017566949), (3.087669338, -0.059977315))
            Line((3.087669338, -0.059977315), (3.086019586, 0))
        make_face()
    chamfer1_piece_13b = extrude(amount=29.430097928, mode=Mode.PRIVATE)
    chamfer1_piece_13b = split(chamfer1_piece_13b, bisect_by=Plane(origin=(24.25, -47.98938088, 23.26061912), z_dir=(-1, 0, 0)), keep=Keep.TOP, mode=Mode.PRIVATE)
    chamfer1_piece_13 = chamfer1_piece_13a & chamfer1_piece_13b
    add(chamfer1_piece_13, mode=Mode.SUBTRACT)
    with BuildSketch(Plane(origin=(24.25, 7.715048964, -24.25), x_dir=(0.027495876610586768, 0, 0.9996219169112968), z_dir=(0, -1, 0))) as chamfer1_piece_14a_section:
        with BuildLine():
            Line((3.086019586, 0), (-0.169641465, 3.081353381))
            Line((-0.169641465, 3.081353381), (-0.22961878, 3.079703628))
            ThreePointArc((-0.22961878, 3.079703628), (-0.102387681, 1.540193489), (-0.059977315, -0.001649753))
            Line((-0.059977315, -0.001649753), (0.001649753, -0.059977315))
            ThreePointArc((0.001649753, -0.059977315), (1.543492994, -0.017566949), (3.087669338, -0.059977315))
            Line((3.087669338, -0.059977315), (3.086019586, 0))
        make_face()
    chamfer1_piece_14a = extrude(amount=62.430097928, mode=Mode.PRIVATE)
    chamfer1_piece_14a = split(chamfer1_piece_14a, bisect_by=Plane(origin=(23.26061912, -47, -23.26061912), z_dir=(0, -1, 0)), keep=Keep.TOP, mode=Mode.PRIVATE)
    with BuildSketch(Plane(origin=(45.965048964, -47, -24.25), x_dir=(0, -0.9996219169112965, -0.02749587661058676), z_dir=(-1, 0, 0))) as chamfer1_piece_14b_section:
        with BuildLine():
            Line((3.086019586, 0), (-0.169641465, 3.081353381))
            Line((-0.169641465, 3.081353381), (-0.22961878, 3.079703628))
            ThreePointArc((-0.22961878, 3.079703628), (-0.102387681, 1.540193489), (-0.059977315, -0.001649753))
            Line((-0.059977315, -0.001649753), (0.001649753, -0.059977315))
            ThreePointArc((0.001649753, -0.059977315), (1.543492994, -0.017566949), (3.087669338, -0.059977315))
            Line((3.087669338, -0.059977315), (3.086019586, 0))
        make_face()
    chamfer1_piece_14b = extrude(amount=29.430097928, mode=Mode.PRIVATE)
    chamfer1_piece_14b = split(chamfer1_piece_14b, bisect_by=Plane(origin=(24.25, -47.98938088, -23.26061912), z_dir=(-1, 0, 0)), keep=Keep.TOP, mode=Mode.PRIVATE)
    chamfer1_piece_14 = chamfer1_piece_14a & chamfer1_piece_14b
    add(chamfer1_piece_14, mode=Mode.SUBTRACT)

    # Sketch11 → Cut-Extrude6 (cut, two sides: drawn at the far end of the back side and taken through both)
    with BuildSketch(Plane(origin=(0, 0, 0), x_dir=(1, 0, 0), z_dir=(0, 1, 0)).offset(CUT_EXTRUDE6_START - CUT_EXTRUDE6_DEPTH_BACK)):
        Rectangle(SKETCH11_W, SKETCH11_H)
    extrude(amount=CUT_EXTRUDE6_DEPTH + CUT_EXTRUDE6_DEPTH_BACK, mode=Mode.SUBTRACT)


solid = part.part
